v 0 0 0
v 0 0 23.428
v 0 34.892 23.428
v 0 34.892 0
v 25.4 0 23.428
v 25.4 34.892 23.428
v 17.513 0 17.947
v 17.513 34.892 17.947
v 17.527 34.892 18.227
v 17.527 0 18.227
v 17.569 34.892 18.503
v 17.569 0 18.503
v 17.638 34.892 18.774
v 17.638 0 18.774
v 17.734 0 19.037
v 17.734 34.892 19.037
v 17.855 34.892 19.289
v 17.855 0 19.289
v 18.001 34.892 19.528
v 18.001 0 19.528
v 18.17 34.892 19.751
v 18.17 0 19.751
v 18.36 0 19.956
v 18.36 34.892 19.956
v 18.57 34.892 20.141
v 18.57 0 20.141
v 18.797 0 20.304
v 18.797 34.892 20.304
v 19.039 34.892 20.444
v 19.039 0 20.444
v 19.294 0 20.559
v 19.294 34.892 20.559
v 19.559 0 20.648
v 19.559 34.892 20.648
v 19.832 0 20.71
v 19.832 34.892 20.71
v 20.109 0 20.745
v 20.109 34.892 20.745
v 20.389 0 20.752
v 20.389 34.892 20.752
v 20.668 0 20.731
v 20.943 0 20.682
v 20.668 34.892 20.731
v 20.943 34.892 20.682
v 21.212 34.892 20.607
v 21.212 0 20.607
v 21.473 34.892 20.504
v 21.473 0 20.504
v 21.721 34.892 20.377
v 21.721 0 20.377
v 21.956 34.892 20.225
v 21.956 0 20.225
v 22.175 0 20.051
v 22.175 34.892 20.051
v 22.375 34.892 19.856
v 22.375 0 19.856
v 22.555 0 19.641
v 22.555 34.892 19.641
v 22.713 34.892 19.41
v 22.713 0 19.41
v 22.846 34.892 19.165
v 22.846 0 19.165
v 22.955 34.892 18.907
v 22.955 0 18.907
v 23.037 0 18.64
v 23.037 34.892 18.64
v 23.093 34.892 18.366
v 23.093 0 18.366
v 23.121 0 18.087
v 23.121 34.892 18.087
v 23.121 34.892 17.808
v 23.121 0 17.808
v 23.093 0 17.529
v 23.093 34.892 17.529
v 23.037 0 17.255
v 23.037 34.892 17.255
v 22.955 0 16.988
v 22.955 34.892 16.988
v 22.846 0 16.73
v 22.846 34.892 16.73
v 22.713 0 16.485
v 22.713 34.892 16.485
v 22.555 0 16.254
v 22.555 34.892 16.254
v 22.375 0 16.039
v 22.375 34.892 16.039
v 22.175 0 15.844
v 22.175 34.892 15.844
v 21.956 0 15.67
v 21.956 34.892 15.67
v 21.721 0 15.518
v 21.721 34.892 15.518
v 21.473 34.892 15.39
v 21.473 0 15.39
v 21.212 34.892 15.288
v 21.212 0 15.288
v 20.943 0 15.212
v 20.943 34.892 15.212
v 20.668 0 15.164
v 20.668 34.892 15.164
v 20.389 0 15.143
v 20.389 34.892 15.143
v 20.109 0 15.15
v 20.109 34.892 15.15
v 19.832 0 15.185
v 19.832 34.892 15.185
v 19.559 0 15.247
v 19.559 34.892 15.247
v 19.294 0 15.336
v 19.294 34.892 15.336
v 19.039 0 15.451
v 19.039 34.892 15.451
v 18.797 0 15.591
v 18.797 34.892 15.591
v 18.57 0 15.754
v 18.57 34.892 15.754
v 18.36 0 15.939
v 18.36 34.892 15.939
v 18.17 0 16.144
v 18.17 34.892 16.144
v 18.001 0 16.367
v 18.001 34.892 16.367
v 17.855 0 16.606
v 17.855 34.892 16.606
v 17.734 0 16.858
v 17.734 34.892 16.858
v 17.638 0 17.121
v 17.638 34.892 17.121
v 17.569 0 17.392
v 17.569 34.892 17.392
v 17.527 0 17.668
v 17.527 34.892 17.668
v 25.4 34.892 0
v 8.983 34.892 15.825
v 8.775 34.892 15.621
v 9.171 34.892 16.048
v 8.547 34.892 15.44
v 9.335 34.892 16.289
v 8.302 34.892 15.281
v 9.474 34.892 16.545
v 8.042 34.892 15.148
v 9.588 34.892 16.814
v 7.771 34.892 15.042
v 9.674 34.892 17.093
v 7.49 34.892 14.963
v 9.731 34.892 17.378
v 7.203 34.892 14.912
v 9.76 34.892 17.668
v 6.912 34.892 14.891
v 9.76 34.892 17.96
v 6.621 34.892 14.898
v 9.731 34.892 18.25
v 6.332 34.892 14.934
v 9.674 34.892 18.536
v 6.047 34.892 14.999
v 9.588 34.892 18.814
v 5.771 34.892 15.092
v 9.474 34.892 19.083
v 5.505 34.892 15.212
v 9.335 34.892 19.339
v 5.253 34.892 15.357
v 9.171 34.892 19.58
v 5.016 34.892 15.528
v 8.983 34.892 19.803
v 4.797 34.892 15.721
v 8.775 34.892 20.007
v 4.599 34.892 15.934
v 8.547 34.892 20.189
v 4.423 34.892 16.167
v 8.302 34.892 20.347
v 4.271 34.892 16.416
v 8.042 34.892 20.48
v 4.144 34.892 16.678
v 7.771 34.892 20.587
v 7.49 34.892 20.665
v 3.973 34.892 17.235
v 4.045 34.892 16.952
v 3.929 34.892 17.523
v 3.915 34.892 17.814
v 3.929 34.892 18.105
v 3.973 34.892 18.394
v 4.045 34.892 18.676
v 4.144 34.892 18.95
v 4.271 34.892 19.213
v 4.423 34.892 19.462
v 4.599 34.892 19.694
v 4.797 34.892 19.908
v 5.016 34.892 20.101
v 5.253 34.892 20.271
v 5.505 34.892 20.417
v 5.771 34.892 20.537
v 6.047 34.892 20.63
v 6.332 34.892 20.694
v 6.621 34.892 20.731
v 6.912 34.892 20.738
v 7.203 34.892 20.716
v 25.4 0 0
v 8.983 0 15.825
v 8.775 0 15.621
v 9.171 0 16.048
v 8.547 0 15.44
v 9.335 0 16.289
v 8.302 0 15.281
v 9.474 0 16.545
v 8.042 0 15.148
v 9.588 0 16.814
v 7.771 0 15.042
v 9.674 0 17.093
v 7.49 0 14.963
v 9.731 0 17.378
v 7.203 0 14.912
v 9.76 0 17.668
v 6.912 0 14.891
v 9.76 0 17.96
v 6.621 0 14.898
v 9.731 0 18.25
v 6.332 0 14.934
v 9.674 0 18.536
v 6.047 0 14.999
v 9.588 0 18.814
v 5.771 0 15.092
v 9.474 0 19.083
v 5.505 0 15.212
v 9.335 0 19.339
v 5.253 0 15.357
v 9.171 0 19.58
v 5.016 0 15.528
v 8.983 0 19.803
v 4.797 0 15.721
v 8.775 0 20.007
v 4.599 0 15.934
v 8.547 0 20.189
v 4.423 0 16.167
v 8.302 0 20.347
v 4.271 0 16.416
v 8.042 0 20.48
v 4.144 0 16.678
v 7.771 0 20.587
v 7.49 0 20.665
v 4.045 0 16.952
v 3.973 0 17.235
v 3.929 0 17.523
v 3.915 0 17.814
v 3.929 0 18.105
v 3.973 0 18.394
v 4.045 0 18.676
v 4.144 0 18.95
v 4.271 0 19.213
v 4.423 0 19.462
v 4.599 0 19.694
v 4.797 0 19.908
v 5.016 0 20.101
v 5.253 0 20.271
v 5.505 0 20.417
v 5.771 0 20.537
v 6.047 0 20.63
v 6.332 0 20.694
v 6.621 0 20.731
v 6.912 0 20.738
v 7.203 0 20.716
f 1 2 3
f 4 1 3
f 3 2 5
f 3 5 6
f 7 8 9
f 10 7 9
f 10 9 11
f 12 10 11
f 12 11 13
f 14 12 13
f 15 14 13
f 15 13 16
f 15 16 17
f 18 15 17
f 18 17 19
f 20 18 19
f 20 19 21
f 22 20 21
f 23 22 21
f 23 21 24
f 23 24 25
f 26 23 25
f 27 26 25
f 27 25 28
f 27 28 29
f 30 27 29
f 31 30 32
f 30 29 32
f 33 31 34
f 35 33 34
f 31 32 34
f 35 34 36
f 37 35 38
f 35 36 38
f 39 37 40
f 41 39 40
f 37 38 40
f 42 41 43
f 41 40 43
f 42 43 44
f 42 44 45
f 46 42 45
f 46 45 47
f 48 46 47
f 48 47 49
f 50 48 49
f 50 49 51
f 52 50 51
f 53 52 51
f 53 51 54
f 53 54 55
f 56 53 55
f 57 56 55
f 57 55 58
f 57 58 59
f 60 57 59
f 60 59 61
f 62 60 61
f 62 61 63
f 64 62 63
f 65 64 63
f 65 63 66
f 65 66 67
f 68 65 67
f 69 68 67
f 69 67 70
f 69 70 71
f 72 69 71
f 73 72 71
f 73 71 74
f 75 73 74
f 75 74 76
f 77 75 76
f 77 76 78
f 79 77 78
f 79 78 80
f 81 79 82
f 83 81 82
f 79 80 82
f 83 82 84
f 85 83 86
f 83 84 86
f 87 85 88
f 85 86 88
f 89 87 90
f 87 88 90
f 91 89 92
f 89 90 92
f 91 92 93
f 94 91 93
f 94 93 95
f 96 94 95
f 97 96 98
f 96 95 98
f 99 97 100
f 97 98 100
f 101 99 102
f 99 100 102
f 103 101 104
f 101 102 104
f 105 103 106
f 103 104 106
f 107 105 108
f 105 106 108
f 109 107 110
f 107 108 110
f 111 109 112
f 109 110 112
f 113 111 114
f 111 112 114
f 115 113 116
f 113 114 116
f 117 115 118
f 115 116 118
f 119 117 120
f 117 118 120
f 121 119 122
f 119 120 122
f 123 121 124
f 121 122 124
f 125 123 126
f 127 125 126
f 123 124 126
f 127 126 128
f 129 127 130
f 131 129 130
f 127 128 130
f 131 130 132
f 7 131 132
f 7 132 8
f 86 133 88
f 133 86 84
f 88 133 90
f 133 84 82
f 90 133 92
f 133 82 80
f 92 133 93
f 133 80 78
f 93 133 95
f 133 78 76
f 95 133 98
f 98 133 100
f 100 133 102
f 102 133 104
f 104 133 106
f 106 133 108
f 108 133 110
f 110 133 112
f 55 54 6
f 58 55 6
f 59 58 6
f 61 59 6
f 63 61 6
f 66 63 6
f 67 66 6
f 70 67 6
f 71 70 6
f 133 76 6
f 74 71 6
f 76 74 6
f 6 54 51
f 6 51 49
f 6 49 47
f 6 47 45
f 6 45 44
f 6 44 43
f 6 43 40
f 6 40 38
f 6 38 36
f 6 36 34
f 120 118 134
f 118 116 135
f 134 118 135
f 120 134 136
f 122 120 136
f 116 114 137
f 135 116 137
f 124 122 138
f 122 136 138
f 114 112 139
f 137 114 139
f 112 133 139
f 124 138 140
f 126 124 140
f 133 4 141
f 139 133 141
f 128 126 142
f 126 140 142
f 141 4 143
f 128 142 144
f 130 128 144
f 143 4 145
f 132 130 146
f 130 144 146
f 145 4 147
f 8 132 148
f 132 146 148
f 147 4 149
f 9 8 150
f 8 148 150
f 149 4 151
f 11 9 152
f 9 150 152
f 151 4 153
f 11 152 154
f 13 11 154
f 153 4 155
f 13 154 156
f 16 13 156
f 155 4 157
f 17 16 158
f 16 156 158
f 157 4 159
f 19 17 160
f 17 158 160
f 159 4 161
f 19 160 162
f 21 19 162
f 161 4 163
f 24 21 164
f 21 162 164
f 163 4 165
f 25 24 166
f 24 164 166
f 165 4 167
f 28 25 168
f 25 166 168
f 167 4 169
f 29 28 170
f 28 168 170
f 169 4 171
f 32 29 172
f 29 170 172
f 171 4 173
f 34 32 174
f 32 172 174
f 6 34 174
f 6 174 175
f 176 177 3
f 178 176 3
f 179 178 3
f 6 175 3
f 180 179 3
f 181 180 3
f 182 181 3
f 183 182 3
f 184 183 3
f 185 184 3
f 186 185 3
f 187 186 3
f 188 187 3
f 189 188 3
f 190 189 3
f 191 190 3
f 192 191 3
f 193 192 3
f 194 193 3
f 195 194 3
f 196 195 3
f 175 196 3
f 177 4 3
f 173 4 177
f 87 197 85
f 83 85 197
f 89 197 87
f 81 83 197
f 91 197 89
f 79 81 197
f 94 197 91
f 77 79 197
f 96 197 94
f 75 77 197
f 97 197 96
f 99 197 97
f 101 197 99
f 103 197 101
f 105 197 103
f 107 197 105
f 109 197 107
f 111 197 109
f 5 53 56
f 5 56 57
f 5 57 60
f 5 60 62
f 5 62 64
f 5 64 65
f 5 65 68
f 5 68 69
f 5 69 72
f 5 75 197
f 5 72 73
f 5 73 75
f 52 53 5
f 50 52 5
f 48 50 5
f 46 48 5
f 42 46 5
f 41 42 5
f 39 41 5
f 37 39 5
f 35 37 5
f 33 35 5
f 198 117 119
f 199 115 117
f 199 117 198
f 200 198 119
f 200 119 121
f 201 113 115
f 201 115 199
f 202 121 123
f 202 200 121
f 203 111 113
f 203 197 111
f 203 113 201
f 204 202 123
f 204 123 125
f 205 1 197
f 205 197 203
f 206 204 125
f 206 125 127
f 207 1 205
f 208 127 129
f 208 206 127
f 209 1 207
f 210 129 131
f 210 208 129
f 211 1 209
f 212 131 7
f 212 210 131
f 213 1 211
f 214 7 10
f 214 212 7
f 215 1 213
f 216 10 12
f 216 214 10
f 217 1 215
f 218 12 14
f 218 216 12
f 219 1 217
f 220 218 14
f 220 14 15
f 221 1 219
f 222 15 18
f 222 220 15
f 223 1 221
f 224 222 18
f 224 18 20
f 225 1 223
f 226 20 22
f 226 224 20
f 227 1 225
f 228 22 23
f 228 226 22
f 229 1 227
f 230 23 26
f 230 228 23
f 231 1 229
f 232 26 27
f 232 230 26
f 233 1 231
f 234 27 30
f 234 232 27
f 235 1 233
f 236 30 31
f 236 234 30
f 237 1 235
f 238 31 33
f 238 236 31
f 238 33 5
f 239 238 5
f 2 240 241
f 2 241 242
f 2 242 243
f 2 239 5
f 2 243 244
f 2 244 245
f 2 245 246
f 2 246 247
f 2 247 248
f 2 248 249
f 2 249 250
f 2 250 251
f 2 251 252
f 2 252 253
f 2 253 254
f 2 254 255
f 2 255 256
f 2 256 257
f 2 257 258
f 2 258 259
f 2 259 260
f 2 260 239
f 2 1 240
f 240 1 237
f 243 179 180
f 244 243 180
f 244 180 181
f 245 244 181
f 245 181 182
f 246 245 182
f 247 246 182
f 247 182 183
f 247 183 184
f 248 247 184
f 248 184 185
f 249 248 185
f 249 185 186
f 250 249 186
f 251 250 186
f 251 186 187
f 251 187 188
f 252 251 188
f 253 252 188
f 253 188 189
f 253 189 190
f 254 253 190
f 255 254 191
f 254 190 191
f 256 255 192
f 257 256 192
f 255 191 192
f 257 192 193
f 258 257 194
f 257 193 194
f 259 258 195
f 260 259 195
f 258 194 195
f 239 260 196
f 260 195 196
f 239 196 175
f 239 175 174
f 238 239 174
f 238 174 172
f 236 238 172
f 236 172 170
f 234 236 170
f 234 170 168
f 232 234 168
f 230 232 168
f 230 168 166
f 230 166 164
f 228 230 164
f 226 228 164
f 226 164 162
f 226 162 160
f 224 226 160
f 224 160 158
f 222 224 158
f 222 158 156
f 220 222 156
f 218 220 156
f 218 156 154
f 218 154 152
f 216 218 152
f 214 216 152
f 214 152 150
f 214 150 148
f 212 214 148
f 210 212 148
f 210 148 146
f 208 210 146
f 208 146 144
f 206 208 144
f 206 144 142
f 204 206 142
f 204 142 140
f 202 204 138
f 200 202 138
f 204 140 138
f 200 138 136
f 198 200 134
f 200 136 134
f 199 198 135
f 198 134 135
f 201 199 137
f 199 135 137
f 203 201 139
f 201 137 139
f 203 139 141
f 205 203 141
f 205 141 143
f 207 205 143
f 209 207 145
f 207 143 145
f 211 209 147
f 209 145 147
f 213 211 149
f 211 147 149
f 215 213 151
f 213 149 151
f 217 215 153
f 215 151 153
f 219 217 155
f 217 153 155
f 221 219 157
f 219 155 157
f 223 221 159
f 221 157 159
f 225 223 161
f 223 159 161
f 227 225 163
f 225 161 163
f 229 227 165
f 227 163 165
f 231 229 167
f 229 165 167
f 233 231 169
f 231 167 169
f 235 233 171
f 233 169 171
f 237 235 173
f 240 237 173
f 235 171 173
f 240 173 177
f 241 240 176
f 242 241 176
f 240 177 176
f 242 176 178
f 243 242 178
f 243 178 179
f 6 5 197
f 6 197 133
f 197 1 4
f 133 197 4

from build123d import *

# Parameters (mm, degrees)
F0_W     = 34.89244
F0_H     = 23.427777
F1_DEPTH = 25.4
F2_R     = 2.80533
F2_R_2   = 2.924594
F3_DEPTH = 34.89344


with BuildPart() as f1:
    # F0 (on Right) → F1 (new body)
    with BuildSketch(Plane.YZ):
        with Locations((17.44622, 11.713888)):
            Rectangle(F0_W, F0_H)
    extrude(amount=F1_DEPTH)

    # F2 (on face) → F3 (cut, through all)
    with BuildSketch(Plane(origin=(0, 34.89244, 0), x_dir=(-1, 0, 0), z_dir=(0, 1, 0))):
        with Locations((-20.318756, 17.947417)):
            Circle(F2_R)
        with Locations((-6.839417, 17.814223)):
            Circle(F2_R_2)
    extrude(amount=-F3_DEPTH, mode=Mode.SUBTRACT)


solid = f1.part
